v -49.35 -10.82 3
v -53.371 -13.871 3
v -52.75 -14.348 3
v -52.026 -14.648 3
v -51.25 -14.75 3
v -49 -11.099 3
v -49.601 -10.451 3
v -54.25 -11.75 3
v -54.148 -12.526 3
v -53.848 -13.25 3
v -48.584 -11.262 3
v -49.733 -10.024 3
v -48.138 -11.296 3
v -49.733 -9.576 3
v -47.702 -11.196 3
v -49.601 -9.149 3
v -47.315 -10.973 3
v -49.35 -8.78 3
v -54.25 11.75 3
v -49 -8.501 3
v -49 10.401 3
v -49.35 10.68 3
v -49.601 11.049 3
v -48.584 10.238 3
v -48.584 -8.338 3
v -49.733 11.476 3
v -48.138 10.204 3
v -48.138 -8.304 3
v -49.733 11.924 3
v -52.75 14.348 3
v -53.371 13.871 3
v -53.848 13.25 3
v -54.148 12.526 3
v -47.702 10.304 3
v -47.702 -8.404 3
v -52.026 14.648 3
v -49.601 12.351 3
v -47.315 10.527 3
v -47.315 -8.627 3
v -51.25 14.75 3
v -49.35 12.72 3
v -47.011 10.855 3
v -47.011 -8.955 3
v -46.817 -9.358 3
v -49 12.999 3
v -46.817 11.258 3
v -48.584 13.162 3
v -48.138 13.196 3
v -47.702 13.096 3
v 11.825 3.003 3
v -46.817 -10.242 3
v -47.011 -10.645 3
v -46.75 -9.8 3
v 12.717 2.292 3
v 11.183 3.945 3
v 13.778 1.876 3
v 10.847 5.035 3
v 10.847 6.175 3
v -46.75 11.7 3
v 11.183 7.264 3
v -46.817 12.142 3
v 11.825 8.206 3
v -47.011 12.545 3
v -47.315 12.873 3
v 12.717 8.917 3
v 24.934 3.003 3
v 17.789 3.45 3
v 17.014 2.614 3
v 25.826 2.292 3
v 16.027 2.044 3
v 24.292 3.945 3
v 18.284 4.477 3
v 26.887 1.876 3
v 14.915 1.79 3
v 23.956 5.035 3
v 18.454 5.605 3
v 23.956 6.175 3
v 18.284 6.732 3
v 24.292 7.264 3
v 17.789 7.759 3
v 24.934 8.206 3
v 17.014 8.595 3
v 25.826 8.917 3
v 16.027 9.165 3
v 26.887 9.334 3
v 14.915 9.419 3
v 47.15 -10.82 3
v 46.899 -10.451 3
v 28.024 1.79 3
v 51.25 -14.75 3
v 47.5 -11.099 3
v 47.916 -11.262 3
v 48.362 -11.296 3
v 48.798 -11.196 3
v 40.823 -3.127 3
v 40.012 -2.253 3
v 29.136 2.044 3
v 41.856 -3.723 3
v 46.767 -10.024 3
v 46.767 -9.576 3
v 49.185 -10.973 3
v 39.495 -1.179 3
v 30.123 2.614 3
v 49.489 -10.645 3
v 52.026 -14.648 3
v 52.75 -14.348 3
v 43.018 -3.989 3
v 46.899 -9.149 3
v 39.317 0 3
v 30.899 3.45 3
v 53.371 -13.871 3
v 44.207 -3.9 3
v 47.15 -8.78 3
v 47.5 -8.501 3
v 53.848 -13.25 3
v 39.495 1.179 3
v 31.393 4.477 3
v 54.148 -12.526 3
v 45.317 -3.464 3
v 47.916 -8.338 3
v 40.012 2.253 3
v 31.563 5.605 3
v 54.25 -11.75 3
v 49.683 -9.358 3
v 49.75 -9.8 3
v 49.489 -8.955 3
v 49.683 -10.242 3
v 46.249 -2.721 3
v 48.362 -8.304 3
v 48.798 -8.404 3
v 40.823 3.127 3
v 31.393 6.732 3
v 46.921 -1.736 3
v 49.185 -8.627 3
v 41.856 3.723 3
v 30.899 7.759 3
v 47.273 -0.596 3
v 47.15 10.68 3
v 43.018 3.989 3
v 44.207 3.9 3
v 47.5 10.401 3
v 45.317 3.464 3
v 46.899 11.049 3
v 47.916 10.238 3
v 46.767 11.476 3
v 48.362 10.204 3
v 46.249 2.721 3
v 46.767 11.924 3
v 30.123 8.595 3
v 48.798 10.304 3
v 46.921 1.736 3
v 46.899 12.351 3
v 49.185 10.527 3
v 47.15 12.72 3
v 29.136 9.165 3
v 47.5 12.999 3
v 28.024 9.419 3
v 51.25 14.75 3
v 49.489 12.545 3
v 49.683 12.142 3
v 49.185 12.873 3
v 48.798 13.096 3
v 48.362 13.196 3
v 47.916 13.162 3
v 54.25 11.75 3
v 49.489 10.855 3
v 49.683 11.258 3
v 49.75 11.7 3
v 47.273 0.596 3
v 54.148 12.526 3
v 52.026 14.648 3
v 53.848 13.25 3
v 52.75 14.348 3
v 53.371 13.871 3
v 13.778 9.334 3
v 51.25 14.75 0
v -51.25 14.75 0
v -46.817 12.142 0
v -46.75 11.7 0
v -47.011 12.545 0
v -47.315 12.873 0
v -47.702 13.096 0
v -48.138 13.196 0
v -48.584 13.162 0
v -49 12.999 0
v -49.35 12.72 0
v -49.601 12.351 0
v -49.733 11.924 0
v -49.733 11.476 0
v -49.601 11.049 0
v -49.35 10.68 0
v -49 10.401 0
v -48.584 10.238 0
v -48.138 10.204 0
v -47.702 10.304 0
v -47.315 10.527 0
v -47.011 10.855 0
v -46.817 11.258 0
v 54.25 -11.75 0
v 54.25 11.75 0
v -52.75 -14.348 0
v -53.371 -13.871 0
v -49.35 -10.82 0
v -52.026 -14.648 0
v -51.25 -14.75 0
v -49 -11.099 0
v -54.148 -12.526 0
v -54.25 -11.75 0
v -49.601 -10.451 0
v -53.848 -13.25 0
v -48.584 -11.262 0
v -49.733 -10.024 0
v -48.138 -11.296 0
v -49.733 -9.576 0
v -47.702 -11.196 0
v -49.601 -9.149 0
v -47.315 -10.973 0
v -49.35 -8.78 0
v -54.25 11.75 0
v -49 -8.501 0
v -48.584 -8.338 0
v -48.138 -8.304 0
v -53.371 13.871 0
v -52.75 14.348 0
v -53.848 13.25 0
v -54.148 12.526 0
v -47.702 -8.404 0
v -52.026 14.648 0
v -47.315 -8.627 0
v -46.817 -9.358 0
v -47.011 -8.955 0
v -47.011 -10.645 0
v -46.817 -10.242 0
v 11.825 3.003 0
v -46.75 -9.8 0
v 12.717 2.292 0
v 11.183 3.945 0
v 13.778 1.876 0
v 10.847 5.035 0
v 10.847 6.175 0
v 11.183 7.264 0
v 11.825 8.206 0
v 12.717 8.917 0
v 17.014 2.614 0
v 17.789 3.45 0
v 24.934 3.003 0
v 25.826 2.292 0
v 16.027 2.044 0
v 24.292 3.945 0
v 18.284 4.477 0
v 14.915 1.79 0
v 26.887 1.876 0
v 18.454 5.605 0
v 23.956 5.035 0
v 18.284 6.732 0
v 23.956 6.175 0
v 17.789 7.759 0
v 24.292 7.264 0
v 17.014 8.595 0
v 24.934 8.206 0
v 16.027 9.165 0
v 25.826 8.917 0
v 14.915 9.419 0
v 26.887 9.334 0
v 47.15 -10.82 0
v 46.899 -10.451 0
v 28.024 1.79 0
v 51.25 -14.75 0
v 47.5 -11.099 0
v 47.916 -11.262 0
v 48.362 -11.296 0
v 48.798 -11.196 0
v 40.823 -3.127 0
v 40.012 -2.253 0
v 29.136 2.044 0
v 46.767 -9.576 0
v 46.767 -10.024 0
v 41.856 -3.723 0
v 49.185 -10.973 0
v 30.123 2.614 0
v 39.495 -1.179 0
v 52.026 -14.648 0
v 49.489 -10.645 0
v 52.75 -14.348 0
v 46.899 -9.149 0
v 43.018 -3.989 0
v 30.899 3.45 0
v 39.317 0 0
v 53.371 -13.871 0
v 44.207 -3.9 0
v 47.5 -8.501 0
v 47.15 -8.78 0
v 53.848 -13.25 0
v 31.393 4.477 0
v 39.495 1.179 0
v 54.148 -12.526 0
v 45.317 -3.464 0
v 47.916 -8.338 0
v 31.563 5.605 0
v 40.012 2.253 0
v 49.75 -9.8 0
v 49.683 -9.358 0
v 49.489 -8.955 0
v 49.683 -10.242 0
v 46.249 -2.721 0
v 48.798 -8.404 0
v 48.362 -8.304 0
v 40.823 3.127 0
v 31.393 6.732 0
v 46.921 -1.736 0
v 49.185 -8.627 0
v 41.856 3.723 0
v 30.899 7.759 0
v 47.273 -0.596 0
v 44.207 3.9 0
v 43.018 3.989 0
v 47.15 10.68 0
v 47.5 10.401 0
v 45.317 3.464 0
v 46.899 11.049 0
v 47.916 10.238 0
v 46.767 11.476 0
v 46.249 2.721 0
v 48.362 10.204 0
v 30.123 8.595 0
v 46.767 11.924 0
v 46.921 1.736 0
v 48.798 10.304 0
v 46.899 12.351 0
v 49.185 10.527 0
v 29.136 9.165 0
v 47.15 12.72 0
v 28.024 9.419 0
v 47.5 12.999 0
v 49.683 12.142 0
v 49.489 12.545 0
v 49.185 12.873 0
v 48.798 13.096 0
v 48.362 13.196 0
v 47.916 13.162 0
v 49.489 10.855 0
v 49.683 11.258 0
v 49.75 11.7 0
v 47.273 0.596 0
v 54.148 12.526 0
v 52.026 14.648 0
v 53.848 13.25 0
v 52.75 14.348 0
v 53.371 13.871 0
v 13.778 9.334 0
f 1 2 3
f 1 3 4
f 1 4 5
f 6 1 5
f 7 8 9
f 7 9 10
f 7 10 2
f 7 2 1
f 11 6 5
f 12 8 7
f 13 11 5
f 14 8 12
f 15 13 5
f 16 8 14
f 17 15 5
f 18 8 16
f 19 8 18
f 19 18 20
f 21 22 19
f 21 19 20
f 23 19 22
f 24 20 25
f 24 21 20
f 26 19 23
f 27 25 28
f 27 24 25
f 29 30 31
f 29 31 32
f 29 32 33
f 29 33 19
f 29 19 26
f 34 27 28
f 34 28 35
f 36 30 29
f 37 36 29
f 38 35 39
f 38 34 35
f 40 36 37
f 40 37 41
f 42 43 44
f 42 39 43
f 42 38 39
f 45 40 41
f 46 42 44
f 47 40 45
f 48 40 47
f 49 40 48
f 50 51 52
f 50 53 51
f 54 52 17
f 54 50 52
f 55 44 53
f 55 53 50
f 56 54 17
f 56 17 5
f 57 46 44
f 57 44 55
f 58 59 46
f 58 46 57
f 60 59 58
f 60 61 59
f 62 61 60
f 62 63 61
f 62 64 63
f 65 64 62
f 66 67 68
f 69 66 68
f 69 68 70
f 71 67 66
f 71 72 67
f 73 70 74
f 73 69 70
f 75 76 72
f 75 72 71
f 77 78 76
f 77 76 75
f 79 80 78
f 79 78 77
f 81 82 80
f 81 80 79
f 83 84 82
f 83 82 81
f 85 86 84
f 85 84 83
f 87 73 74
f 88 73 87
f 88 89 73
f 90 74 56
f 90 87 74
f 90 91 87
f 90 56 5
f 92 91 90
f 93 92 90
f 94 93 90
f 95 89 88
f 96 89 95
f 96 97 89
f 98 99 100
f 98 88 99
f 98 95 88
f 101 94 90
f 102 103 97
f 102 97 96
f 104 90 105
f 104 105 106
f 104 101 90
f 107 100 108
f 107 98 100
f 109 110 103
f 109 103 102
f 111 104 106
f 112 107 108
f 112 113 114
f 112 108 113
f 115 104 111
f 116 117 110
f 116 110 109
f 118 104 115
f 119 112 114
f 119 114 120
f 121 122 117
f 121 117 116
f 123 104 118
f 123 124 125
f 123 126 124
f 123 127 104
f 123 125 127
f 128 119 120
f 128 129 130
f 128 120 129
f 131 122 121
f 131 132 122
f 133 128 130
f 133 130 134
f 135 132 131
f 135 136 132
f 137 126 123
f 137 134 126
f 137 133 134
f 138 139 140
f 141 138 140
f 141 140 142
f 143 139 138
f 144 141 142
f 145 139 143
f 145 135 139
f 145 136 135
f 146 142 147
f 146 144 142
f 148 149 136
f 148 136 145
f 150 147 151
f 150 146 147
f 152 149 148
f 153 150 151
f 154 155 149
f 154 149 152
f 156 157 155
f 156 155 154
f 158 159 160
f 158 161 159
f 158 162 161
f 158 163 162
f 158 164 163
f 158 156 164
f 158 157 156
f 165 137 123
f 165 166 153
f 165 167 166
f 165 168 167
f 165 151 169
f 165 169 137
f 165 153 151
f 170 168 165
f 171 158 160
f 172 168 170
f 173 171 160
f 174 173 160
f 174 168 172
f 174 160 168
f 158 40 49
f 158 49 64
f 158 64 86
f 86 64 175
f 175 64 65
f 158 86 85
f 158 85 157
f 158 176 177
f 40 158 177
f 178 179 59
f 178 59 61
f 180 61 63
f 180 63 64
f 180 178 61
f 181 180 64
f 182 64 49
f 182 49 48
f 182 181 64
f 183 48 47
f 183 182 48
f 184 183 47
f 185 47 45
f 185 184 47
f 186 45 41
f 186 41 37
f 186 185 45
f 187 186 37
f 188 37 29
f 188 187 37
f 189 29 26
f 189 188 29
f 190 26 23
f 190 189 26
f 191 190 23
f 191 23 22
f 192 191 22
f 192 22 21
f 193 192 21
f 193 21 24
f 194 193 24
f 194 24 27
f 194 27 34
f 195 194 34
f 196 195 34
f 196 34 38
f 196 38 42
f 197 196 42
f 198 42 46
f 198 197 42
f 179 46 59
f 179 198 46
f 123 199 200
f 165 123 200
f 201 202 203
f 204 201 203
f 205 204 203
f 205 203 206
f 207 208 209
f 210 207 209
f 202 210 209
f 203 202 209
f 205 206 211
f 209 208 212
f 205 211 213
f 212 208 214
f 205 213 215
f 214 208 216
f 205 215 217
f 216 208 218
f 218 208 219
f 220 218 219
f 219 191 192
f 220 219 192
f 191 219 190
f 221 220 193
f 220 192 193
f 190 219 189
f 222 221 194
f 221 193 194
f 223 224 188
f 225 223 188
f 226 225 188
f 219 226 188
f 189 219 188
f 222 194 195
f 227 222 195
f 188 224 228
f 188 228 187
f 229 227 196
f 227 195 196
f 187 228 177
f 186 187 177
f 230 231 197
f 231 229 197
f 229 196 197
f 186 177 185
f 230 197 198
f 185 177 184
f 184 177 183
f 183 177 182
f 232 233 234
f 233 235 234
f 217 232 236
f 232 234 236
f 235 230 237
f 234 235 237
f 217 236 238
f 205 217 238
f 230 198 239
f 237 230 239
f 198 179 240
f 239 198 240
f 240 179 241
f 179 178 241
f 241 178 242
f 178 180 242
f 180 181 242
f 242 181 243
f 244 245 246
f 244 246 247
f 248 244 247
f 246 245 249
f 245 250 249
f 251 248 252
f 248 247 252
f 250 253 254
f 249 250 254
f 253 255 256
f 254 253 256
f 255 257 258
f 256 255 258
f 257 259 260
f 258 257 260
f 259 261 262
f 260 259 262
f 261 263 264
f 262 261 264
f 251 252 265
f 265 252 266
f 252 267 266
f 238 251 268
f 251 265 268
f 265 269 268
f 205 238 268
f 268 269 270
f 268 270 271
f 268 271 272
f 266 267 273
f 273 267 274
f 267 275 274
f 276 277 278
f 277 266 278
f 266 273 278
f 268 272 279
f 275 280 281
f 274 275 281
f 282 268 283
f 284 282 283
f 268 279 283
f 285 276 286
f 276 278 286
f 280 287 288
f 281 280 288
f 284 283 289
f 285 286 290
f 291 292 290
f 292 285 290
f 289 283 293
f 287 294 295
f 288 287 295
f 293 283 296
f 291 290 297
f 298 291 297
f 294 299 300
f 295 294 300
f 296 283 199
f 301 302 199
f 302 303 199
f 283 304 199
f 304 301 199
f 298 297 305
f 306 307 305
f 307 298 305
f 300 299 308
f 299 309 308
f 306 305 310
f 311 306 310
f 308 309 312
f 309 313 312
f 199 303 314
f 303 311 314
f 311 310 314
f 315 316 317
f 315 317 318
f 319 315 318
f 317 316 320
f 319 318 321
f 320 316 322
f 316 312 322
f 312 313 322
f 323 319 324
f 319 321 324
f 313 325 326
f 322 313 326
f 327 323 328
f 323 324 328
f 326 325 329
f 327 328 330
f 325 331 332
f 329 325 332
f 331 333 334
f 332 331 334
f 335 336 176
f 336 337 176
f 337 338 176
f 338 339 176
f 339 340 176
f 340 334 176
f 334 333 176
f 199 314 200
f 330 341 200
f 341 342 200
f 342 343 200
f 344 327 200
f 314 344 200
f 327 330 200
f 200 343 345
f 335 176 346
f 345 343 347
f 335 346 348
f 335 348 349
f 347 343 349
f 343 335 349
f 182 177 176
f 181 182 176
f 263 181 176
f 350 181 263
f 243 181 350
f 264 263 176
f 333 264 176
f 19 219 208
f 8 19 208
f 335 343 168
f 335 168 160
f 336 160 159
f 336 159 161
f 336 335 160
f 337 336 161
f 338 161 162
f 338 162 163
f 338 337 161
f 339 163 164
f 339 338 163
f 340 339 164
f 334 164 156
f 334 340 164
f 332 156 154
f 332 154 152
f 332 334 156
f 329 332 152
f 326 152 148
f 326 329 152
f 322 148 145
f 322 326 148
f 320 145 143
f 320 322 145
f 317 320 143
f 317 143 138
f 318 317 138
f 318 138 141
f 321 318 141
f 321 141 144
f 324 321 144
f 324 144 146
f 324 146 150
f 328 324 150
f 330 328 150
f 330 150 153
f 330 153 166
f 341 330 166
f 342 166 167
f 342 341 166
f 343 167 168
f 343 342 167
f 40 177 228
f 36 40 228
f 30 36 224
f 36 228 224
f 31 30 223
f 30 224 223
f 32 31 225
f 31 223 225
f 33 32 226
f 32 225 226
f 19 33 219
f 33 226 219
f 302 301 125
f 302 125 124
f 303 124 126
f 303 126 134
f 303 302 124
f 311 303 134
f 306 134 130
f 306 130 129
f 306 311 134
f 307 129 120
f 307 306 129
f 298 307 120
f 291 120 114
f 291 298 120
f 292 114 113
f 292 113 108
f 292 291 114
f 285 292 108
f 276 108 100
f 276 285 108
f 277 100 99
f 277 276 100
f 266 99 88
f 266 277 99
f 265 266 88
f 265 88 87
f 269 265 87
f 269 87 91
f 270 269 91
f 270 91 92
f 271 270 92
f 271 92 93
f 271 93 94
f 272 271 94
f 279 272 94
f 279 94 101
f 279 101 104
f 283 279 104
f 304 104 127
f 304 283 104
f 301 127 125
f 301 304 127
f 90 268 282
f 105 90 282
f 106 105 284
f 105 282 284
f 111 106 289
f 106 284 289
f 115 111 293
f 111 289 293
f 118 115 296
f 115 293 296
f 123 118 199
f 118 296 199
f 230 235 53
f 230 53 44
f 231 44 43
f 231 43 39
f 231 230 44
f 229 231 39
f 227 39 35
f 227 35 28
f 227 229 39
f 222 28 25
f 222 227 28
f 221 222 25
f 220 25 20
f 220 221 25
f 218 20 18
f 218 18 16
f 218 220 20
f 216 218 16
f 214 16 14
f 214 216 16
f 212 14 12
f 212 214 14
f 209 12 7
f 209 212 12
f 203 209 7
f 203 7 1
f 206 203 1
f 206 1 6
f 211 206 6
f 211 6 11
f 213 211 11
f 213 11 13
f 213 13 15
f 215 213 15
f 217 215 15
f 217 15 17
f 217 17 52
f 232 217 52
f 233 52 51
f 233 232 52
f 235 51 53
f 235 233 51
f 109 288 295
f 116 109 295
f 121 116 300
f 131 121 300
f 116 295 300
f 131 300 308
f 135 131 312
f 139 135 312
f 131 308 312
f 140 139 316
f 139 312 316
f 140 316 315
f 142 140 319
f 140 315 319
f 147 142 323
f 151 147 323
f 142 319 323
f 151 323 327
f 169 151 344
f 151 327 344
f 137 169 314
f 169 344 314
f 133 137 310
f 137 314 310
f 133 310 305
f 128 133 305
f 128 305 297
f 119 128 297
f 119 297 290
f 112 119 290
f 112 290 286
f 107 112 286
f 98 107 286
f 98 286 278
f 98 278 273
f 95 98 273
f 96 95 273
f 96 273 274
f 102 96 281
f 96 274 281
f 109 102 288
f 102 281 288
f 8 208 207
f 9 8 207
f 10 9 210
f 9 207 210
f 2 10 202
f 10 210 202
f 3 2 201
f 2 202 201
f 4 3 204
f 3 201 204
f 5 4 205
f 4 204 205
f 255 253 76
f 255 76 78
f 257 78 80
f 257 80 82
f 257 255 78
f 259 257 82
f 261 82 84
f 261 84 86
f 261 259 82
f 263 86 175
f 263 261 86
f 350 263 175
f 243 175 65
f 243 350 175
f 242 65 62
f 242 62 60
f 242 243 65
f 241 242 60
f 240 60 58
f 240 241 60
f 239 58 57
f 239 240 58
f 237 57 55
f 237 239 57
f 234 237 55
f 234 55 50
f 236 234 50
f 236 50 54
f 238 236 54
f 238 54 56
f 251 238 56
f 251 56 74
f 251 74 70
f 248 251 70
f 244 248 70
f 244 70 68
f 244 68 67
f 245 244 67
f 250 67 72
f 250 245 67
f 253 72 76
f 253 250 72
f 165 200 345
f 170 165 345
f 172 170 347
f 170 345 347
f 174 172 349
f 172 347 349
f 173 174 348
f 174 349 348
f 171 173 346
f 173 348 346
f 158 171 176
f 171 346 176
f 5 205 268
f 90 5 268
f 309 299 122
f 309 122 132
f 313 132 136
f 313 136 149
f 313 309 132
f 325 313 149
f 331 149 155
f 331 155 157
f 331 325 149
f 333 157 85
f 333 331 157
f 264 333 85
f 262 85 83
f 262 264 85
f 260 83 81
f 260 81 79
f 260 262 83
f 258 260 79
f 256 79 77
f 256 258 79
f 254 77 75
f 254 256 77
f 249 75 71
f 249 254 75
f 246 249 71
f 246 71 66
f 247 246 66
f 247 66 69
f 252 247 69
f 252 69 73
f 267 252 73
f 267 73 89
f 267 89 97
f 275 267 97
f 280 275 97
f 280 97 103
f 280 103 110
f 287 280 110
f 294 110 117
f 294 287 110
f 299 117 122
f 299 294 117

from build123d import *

# Parameters (mm, degrees)
F0_R     = 1.5
F0_R_2   = 3.825
F1_DEPTH = 3


with BuildPart() as f1:
    # F0 (on Top) → F1 (new body)
    with BuildSketch(Plane.XY):
        with BuildLine():
            Line((54.25, -11.75), (54.25, 0))
            Line((54.25, 0), (47.317251, 0))
            ThreePointArc((47.317251, 0), (43.317251, -4), (39.317251, 0))
            Line((39.317251, 0), (-54.25, 0))
            Line((-54.25, 0), (-54.25, -11.75))
            ThreePointArc((-54.25, -11.75), (-53.37132, -13.87132), (-51.25, -14.75))
            Line((-51.25, -14.75), (51.25, -14.75))
            ThreePointArc((51.25, -14.75), (53.37132, -13.87132), (54.25, -11.75))
        make_face()
        with Locations((-48.25, -9.8)):
            Circle(F0_R, mode=Mode.SUBTRACT)
        with Locations((48.25, -9.8)):
            Circle(F0_R, mode=Mode.SUBTRACT)
        with BuildLine():
            ThreePointArc((54.25, 11.75), (53.37132, 13.87132), (51.25, 14.75))
            Line((51.25, 14.75), (-51.25, 14.75))
            ThreePointArc((-51.25, 14.75), (-53.37132, 13.87132), (-54.25, 11.75))
            Line((-54.25, 11.75), (-54.25, 0))
            Line((-54.25, 0), (39.317251, 0))
            ThreePointArc((39.317251, 0), (43.317251, 4), (47.317251, 0))
            Line((47.317251, 0), (54.25, 0))
            Line((54.25, 0), (54.25, 11.75))
        make_face()
        with Locations((-48.25, 11.7)):
            Circle(F0_R, mode=Mode.SUBTRACT)
        with Locations((14.629073, 5.604644)):
            Circle(F0_R_2, mode=Mode.SUBTRACT)
        with Locations((27.738241, 5.604644)):
            Circle(F0_R_2, mode=Mode.SUBTRACT)
        with Locations((48.25, 11.7)):
            Circle(F0_R, mode=Mode.SUBTRACT)
    extrude(amount=F1_DEPTH)


solid = f1.part
